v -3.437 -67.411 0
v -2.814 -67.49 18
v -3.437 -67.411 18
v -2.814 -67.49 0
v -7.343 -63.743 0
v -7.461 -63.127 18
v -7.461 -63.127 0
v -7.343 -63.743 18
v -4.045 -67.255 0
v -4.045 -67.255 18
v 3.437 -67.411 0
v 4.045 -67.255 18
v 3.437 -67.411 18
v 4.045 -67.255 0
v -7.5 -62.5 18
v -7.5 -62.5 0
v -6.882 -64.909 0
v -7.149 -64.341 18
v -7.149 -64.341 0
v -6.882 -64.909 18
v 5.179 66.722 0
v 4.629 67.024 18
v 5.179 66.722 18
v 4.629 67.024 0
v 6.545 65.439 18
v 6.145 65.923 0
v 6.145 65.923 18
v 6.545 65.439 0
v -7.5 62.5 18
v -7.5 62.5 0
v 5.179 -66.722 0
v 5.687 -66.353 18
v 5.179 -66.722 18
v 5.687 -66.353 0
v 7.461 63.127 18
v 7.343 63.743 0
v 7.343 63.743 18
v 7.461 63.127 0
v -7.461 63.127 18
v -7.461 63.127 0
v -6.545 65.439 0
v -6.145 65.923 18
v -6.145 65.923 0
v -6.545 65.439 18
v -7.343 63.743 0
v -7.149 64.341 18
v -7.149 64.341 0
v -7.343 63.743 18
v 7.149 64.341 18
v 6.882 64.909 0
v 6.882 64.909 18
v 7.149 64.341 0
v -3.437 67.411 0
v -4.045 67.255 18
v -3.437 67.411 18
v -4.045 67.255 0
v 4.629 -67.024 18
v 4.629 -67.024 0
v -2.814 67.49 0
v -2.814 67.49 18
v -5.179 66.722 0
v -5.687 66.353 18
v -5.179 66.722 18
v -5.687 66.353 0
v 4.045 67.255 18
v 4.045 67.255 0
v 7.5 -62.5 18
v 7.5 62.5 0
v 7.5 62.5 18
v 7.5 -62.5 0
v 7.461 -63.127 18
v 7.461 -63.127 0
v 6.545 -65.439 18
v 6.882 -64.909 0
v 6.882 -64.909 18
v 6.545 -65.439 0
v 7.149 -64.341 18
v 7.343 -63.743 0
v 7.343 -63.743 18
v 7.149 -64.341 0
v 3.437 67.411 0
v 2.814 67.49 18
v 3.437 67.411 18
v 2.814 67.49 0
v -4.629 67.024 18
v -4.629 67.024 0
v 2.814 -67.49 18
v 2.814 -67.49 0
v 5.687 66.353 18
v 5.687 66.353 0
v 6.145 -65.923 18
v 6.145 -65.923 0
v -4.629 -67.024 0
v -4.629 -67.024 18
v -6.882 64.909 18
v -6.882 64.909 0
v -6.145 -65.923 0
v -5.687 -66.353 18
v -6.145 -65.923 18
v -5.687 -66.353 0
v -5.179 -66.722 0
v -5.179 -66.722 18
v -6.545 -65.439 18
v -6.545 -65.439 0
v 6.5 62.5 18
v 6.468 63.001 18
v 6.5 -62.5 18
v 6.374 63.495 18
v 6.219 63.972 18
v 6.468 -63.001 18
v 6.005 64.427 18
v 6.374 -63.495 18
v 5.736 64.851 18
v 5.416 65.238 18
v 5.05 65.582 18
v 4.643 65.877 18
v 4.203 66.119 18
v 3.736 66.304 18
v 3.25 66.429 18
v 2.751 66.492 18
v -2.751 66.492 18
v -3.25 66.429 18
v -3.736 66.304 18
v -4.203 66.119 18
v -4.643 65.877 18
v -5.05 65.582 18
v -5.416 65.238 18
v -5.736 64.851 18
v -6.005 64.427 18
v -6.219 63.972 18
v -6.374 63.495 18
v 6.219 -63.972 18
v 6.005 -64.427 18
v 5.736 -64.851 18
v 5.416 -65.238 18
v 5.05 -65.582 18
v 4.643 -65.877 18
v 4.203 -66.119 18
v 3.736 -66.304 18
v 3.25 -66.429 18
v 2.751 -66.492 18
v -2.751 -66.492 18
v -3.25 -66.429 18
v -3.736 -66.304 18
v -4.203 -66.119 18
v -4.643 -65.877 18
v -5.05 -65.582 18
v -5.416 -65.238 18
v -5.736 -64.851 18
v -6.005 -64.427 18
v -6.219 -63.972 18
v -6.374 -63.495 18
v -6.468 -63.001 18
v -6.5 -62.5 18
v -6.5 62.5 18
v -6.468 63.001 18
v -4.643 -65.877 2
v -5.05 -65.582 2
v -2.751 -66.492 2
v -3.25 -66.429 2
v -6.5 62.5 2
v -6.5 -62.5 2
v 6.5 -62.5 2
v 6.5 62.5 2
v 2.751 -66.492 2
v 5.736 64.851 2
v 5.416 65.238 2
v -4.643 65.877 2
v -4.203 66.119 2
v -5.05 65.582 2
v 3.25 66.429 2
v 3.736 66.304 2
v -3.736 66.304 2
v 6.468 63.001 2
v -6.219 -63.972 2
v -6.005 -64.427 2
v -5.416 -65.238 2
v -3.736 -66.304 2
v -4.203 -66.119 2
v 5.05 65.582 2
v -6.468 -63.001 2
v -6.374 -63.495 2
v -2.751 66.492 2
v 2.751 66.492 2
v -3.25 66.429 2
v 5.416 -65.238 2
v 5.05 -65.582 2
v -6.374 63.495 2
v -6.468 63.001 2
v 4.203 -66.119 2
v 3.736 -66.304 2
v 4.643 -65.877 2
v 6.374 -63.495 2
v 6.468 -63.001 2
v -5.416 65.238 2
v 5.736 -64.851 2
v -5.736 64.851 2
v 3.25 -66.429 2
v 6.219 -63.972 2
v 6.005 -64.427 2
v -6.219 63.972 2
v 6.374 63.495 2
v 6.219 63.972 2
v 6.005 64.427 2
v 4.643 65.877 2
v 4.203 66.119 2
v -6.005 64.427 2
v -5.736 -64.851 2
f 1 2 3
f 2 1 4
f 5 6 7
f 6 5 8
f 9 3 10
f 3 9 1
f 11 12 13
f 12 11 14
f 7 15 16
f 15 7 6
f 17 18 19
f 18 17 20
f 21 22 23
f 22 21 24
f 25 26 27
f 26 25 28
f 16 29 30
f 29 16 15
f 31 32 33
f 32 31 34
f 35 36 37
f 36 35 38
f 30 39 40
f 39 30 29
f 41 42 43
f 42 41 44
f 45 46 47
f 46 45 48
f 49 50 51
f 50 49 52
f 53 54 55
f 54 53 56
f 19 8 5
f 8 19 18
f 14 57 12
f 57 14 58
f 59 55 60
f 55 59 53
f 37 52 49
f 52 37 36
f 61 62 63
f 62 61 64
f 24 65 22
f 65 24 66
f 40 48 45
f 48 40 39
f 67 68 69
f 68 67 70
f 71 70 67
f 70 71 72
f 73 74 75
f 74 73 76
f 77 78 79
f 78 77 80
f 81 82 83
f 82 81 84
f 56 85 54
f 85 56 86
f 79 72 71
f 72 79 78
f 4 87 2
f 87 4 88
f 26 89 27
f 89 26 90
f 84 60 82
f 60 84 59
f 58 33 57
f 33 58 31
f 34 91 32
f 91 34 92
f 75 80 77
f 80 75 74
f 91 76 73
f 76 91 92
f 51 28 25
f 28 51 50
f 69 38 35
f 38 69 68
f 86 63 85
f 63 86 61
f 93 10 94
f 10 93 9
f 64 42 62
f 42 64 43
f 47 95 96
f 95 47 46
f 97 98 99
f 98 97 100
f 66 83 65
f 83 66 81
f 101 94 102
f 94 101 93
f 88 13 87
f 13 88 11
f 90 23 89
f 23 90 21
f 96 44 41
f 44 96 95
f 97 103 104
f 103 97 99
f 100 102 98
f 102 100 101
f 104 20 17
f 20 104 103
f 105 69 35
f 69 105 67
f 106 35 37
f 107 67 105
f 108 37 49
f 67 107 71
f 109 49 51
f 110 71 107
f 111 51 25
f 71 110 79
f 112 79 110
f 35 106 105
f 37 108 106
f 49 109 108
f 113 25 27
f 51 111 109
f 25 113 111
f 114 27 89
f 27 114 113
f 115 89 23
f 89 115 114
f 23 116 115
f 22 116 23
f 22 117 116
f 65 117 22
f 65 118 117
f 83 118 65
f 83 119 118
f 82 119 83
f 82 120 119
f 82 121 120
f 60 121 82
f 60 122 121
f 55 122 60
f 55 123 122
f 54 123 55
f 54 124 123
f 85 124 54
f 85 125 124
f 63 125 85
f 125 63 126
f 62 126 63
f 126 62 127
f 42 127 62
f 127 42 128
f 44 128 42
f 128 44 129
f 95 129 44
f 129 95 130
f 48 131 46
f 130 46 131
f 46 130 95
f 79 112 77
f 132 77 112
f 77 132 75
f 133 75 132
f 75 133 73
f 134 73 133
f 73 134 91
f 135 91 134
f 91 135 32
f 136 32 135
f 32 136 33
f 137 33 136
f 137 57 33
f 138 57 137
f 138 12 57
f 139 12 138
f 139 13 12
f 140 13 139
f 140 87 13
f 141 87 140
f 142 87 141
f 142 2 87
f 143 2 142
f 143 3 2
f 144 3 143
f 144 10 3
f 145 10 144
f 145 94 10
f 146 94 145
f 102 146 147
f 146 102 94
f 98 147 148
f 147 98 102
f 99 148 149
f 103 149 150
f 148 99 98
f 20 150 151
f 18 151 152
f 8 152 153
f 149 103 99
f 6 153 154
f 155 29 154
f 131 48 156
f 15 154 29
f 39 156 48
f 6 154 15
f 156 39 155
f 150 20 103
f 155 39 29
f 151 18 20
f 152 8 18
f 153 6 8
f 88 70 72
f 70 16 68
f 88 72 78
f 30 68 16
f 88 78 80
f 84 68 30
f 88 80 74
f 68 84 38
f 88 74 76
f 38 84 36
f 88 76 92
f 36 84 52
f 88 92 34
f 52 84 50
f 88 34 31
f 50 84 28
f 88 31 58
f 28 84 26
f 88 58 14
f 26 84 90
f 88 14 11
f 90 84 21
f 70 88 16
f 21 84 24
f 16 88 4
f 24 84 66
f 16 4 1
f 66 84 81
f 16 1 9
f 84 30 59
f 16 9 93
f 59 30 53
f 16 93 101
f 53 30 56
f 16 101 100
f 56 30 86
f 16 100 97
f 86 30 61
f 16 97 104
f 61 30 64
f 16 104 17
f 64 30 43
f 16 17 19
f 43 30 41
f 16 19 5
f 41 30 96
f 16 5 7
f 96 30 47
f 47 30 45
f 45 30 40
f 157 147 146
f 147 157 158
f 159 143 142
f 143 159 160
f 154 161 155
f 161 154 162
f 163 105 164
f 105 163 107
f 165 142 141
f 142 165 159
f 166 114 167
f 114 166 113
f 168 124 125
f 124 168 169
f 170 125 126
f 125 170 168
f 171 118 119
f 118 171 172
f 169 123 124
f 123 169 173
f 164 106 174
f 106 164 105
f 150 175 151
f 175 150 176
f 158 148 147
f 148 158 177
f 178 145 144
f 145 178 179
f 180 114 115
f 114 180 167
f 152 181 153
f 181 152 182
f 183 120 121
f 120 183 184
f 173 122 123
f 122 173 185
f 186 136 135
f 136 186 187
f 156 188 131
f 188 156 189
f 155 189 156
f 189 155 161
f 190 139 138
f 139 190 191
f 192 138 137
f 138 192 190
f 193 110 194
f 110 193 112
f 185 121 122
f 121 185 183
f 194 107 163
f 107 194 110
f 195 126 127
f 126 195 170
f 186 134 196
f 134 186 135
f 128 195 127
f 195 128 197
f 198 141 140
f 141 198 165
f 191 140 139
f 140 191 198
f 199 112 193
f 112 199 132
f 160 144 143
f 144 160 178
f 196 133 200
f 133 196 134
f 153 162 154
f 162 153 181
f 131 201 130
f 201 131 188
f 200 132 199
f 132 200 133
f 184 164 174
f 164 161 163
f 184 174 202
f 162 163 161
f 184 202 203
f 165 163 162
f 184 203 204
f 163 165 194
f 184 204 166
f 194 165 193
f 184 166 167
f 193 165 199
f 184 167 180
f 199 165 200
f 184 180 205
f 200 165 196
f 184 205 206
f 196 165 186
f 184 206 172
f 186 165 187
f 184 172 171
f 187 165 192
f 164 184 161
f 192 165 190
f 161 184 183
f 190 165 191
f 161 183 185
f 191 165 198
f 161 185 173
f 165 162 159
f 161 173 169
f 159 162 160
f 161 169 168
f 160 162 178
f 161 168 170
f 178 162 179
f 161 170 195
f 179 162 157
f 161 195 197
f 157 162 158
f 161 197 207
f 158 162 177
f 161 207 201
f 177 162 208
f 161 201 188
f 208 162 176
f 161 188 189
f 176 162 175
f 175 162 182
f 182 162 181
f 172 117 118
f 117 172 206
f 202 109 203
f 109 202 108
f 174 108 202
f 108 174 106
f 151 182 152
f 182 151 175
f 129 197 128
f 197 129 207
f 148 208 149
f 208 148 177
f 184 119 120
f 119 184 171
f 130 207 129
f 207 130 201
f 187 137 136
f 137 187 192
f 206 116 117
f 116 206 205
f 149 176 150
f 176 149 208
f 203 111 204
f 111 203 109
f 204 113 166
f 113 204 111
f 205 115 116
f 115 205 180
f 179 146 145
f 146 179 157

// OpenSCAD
$fn = 50;


difference() {
	union() {
		hull() {
			translate(v = [-2.5000000000, 62.5000000000, 0]) {
				cylinder(h = 18, r = 5);
			}
			translate(v = [2.5000000000, 62.5000000000, 0]) {
				cylinder(h = 18, r = 5);
			}
			translate(v = [-2.5000000000, -62.5000000000, 0]) {
				cylinder(h = 18, r = 5);
			}
			translate(v = [2.5000000000, -62.5000000000, 0]) {
				cylinder(h = 18, r = 5);
			}
		}
	}
	union() {
		translate(v = [0, 0, 2]) {
			hull() {
				translate(v = [-2.5000000000, 62.5000000000, 0]) {
					cylinder(h = 16, r = 4);
				}
				translate(v = [2.5000000000, 62.5000000000, 0]) {
					cylinder(h = 16, r = 4);
				}
				translate(v = [-2.5000000000, -62.5000000000, 0]) {
					cylinder(h = 16, r = 4);
				}
				translate(v = [2.5000000000, -62.5000000000, 0]) {
					cylinder(h = 16, r = 4);
				}
			}
		}
	}
}
